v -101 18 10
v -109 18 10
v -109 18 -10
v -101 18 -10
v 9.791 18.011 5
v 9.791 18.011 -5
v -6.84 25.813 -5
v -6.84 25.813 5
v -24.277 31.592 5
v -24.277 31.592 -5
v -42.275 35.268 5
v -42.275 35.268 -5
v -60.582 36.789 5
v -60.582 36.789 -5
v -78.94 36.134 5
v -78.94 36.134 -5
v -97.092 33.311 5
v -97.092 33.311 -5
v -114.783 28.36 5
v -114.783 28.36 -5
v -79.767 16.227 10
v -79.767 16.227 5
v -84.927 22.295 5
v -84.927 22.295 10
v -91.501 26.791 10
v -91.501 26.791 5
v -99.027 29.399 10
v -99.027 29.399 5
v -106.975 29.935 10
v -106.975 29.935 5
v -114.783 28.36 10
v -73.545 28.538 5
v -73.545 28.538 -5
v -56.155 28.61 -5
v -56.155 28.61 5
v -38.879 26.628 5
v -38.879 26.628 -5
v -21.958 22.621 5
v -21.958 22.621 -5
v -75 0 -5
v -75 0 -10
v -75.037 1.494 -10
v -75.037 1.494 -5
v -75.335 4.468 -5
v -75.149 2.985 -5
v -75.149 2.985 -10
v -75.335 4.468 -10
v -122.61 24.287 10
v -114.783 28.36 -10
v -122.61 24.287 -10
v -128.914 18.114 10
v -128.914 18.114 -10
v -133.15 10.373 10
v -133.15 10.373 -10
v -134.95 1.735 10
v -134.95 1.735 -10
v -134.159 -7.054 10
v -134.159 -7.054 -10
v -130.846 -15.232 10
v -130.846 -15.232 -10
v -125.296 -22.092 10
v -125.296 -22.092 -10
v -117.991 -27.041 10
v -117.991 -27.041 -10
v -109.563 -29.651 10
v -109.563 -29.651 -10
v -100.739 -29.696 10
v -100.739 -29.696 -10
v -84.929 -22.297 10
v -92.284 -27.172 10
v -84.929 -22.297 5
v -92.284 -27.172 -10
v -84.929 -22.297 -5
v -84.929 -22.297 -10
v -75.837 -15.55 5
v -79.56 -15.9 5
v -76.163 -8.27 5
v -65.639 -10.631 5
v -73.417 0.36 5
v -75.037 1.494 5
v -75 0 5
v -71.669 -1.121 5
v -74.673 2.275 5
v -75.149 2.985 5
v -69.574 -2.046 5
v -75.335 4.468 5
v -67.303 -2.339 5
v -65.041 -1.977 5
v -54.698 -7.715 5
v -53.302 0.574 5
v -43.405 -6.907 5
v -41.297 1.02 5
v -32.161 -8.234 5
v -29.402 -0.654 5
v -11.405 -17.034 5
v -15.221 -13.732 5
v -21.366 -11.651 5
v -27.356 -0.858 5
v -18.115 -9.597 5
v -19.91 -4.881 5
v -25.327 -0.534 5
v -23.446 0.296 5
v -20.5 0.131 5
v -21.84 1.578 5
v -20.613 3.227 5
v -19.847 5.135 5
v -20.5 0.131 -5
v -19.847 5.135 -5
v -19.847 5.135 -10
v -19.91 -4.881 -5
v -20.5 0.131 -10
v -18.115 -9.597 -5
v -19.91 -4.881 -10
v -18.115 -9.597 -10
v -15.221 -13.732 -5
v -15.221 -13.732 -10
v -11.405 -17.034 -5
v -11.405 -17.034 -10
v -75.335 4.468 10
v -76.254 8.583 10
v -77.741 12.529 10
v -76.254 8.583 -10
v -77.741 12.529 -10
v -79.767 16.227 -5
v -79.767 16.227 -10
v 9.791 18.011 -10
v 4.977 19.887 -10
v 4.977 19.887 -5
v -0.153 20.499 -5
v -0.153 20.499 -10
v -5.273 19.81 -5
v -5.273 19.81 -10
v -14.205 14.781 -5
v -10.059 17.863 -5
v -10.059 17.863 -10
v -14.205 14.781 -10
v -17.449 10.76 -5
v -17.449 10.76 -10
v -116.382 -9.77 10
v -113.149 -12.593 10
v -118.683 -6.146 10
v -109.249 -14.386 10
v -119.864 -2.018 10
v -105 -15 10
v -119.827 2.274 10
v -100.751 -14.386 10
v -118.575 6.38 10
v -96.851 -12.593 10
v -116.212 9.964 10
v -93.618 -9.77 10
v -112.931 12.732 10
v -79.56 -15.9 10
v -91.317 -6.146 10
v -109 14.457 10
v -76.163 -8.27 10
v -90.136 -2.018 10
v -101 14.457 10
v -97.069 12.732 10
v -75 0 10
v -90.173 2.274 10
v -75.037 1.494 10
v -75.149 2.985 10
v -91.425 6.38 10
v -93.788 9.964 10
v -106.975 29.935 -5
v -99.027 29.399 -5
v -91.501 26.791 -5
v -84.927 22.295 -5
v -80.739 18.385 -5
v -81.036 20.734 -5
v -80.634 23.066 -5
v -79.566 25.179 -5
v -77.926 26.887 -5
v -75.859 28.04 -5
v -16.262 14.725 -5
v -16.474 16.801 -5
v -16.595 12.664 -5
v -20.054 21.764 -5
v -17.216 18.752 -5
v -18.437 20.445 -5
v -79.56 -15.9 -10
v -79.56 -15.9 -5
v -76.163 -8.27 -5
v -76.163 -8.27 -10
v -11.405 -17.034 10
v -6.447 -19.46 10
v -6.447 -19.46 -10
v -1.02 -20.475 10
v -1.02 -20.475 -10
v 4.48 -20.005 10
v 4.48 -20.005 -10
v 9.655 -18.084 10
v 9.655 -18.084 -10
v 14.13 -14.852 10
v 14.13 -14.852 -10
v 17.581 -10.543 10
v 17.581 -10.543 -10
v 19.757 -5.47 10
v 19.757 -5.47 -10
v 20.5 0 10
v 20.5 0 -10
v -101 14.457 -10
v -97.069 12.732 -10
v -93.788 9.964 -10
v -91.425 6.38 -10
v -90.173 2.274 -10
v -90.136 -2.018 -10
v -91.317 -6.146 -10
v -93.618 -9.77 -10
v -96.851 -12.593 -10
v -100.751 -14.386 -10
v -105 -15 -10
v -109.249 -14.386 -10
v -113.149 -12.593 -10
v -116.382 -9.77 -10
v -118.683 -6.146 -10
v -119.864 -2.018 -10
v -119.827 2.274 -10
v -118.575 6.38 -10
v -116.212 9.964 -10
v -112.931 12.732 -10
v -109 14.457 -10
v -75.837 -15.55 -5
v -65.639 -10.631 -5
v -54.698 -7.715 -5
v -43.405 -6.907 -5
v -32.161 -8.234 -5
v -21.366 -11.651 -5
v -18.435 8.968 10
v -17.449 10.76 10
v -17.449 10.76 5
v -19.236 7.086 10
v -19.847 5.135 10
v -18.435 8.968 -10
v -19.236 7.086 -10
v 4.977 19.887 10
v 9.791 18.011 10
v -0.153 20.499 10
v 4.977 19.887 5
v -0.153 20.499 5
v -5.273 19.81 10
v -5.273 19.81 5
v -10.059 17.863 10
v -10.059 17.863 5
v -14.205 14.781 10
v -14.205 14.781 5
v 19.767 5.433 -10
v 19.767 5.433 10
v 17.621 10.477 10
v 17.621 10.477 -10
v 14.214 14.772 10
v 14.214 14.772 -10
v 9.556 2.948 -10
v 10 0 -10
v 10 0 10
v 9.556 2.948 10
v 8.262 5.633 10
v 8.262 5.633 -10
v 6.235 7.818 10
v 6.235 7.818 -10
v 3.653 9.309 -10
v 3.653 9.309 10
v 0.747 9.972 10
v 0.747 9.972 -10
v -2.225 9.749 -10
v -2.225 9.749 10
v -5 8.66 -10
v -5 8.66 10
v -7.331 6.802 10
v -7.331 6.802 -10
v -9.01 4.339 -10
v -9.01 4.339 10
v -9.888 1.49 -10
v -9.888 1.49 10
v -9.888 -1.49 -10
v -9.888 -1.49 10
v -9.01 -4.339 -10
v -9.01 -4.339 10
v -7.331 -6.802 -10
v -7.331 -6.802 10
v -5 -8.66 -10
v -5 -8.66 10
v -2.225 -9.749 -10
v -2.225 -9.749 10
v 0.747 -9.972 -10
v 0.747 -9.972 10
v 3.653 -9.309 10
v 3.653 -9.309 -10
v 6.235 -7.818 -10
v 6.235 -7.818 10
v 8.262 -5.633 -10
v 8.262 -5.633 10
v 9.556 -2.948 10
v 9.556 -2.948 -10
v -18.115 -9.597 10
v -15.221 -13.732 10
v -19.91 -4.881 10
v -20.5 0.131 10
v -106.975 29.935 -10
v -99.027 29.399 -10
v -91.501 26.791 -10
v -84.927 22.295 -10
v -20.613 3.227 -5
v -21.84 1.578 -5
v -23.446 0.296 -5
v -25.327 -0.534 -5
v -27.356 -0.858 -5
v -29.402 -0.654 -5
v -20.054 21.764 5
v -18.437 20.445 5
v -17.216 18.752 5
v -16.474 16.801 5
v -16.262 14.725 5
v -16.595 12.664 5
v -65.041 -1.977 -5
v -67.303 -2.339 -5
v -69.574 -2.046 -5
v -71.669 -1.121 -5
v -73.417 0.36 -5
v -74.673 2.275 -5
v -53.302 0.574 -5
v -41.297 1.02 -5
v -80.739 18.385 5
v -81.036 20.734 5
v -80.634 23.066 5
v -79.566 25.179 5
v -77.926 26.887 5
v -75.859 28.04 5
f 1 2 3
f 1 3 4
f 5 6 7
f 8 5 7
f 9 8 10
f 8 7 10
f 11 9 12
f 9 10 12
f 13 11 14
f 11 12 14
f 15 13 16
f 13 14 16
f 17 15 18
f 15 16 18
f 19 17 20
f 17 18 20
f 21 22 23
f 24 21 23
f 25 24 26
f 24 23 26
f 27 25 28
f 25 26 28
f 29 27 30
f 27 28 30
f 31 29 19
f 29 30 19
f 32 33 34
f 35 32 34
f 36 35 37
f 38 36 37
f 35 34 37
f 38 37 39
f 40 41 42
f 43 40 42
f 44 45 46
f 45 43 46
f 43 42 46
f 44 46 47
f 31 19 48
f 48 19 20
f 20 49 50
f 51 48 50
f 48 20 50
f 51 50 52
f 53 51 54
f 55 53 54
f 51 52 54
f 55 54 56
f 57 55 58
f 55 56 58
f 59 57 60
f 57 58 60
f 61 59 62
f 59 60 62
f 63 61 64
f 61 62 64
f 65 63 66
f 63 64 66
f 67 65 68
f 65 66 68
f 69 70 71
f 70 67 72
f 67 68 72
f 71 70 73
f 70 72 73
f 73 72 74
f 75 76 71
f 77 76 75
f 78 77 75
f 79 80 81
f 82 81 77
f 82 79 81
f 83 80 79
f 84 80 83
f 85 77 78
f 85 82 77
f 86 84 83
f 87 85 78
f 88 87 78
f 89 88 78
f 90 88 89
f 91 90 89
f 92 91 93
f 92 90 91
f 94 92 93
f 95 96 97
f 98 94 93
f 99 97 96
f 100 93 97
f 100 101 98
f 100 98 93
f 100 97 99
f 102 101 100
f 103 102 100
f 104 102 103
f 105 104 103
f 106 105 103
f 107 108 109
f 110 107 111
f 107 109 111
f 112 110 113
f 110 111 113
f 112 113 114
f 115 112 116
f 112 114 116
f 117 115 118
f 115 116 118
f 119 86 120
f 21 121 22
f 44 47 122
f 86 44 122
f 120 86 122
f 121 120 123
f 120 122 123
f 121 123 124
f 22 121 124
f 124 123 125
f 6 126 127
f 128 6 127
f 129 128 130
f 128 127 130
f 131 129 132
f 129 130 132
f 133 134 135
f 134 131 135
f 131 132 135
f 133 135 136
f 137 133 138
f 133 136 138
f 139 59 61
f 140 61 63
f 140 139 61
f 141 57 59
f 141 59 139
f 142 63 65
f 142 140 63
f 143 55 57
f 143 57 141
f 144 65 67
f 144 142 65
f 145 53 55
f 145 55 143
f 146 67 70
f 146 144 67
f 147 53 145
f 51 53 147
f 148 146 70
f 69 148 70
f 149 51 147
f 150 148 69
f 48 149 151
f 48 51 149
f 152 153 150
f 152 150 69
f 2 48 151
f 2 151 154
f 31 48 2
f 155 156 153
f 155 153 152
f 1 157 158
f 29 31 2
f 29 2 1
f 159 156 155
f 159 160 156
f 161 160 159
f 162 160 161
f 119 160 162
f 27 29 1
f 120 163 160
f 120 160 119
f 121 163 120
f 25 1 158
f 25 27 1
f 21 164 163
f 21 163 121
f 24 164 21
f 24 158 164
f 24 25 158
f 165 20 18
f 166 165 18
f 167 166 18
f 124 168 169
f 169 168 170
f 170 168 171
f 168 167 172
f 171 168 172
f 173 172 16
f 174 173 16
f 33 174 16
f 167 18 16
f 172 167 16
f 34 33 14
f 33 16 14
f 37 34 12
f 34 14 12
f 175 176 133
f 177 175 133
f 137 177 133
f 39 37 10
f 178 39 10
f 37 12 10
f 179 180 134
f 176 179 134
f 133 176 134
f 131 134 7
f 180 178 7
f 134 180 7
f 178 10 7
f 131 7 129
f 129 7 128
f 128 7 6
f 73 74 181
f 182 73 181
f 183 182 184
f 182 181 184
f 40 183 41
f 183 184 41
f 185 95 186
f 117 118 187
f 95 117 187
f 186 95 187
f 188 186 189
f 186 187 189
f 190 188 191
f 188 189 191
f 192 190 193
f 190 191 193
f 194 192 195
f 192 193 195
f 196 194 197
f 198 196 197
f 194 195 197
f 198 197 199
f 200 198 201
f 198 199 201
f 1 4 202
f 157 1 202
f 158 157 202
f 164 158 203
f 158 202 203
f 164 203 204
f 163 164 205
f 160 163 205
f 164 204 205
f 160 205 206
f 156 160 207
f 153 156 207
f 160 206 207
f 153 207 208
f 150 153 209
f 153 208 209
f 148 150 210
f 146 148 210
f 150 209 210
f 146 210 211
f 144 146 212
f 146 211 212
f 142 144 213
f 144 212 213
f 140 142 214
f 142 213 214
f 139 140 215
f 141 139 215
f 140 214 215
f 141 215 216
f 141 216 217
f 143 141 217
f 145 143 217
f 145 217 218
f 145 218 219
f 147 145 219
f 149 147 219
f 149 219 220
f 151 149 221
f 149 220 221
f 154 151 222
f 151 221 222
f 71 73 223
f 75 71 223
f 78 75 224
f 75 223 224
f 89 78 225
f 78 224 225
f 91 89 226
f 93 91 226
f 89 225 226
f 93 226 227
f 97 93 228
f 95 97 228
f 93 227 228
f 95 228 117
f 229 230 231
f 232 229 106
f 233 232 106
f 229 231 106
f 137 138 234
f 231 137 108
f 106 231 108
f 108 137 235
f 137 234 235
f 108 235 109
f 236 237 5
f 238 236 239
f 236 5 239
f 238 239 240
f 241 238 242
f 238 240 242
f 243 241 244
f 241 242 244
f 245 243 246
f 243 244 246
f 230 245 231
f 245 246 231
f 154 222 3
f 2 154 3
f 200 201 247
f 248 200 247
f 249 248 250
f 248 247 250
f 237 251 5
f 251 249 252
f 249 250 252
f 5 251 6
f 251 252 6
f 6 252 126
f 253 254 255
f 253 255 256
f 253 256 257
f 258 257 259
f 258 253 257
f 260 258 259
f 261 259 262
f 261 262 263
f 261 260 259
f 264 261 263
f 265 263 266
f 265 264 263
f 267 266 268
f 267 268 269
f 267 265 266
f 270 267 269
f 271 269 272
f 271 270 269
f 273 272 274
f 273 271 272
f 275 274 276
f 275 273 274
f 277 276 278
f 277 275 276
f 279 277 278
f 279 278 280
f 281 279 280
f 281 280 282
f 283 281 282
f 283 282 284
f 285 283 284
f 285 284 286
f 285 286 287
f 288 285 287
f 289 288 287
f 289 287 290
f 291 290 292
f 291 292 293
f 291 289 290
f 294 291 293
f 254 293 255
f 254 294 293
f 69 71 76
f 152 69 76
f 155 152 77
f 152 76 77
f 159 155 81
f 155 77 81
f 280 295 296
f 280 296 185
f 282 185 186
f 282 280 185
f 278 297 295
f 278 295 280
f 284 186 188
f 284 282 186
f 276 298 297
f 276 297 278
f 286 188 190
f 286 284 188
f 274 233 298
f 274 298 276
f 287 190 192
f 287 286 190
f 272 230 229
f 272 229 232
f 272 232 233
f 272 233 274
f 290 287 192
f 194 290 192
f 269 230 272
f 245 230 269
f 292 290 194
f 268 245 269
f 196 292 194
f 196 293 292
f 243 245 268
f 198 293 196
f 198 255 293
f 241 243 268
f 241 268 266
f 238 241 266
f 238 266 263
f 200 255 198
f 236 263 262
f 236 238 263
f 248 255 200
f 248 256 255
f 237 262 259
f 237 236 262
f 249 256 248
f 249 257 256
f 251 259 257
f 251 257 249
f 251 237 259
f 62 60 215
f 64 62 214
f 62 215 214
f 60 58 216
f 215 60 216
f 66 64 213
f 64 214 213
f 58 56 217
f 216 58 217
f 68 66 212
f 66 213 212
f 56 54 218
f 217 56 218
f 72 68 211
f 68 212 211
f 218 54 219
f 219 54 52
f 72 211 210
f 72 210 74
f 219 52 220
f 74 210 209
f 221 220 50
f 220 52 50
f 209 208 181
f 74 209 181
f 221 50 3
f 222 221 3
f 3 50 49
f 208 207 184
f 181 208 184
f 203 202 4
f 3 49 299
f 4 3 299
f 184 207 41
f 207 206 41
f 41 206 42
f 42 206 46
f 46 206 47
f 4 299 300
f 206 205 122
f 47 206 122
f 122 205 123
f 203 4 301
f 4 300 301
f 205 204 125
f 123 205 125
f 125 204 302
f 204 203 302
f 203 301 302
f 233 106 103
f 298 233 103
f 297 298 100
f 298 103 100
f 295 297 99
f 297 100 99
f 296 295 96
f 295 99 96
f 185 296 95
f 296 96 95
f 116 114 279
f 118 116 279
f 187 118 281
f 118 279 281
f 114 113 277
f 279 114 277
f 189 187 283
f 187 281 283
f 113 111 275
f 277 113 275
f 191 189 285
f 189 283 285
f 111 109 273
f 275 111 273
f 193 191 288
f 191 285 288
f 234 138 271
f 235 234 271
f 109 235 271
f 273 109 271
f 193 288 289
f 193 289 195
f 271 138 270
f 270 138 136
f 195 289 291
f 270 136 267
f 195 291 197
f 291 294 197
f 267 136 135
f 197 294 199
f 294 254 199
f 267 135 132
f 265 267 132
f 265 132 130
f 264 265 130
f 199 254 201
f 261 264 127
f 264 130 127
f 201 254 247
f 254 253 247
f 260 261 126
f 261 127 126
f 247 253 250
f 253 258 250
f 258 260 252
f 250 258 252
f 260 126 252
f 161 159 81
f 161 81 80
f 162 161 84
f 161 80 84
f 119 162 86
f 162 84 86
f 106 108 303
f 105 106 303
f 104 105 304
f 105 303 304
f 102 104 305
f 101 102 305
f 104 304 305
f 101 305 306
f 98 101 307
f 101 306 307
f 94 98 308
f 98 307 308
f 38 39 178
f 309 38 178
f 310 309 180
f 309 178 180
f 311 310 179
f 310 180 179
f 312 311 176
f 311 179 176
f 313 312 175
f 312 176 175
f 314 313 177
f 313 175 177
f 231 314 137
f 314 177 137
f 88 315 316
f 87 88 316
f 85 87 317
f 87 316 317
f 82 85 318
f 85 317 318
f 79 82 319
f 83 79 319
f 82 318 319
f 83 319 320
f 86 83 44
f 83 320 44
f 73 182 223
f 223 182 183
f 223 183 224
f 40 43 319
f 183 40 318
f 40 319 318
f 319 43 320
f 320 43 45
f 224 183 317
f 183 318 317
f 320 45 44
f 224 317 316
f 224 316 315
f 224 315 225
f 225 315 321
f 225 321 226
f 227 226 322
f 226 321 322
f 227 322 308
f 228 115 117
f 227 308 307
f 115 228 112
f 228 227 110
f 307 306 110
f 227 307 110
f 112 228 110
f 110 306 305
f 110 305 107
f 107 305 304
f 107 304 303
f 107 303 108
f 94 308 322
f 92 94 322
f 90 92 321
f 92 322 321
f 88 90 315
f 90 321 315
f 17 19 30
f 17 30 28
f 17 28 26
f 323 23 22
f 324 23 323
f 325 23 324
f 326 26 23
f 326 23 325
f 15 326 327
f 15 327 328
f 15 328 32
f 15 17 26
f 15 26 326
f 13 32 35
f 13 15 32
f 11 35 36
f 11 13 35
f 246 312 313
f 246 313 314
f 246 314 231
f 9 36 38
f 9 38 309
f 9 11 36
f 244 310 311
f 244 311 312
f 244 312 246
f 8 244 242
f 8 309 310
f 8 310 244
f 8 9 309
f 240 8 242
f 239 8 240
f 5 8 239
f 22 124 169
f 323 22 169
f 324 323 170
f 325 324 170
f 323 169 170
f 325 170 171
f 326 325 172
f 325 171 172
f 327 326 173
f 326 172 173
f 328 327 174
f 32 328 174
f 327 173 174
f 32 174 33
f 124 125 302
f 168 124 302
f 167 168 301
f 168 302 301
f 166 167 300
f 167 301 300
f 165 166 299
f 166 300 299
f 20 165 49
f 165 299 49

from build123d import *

# Parameters (mm, degrees)
BOSS_EXTRUDE1_DEPTH        = 10
BOSS_EXTRUDE1_DEPTH_BACK   = 10
SKETCH1_R                  = 20.5
SKETCH1_R_2                = 10
BOSS_EXTRUDE1_2_DEPTH      = 10
BOSS_EXTRUDE1_2_DEPTH_BACK = 10
SKETCH1_R_3                = 30
BOSS_EXTRUDE3_DEPTH        = 5
BOSS_EXTRUDE3_DEPTH_BACK   = 5


with BuildPart() as part:
    # Sketch1 → Boss-Extrude1 (new, two sides: drawn at the far end of the back side and taken through both)
    with BuildSketch(Plane.XY.offset(-BOSS_EXTRUDE1_DEPTH_BACK)):
        Circle(SKETCH1_R)
        Circle(SKETCH1_R_2, mode=Mode.SUBTRACT)
    extrude(amount=BOSS_EXTRUDE1_DEPTH + BOSS_EXTRUDE1_DEPTH_BACK)



with BuildPart() as body_2:
    # Sketch1 → Boss-Extrude1 2 (new, two sides: drawn at the far end of the back side and taken through both)
    with BuildSketch(Plane.XY.offset(-BOSS_EXTRUDE1_2_DEPTH_BACK)):
        with Locations((-105, 0)):
            Circle(SKETCH1_R_3)
        with BuildLine():
            Line((-101, 18), (-101, 14.456832295))
            ThreePointArc((-101, 14.456832295), (-105, -15), (-109, 14.456832295))
            Line((-109, 14.456832295), (-109, 18))
            Line((-109, 18), (-101, 18))
        make_face(mode=Mode.SUBTRACT)
    extrude(amount=BOSS_EXTRUDE1_2_DEPTH + BOSS_EXTRUDE1_2_DEPTH_BACK)


with BuildPart() as part_1:
    add(part.part)

    add(body_2.part)  # Boss-Extrude3 merges body 2
    # Sketch1<5> → Boss-Extrude3 (add, two sides: drawn at the far end of the back side and taken through both)
    with BuildSketch(Plane.XY.offset(-BOSS_EXTRUDE3_DEPTH_BACK)):
        with BuildLine():
            ThreePointArc((-84.928968254, -22.296943393), (-49.070592623, -7.043942052), (-11.40536084, -17.034310791))
            ThreePointArc((-11.40536084, -17.034310791), (-19.158178407, -7.294806381), (-19.846557236, 5.134604745))
            ThreePointArc((-19.846557236, 5.134604745), (-23.446258475, 0.296093427), (-29.401591979, -0.654192653))
            ThreePointArc((-29.401591979, -0.654192653), (-47.309577117, 1.062360507), (-65.040995656, -1.977258391))
            ThreePointArc((-65.040995656, -1.977258391), (-71.669449556, -1.120833178), (-75.334602536, 4.468130848))
            ThreePointArc((-75.334602536, 4.468130848), (-76.759596366, -10.123220958), (-84.928968254, -22.296943393))
        make_face()
        with BuildLine():
            ThreePointArc((-17.449330151, 10.759687601), (-5.273160122, 19.810193899), (9.791117897, 18.010663795))
            ThreePointArc((9.791117897, 18.010663795), (-51.406147601, 36.300304325), (-114.782571429, 28.360206209))
            ThreePointArc((-114.782571429, 28.360206209), (-95.177372737, 28.346357679), (-79.767134466, 16.226598441))
            ThreePointArc((-79.767134466, 16.226598441), (-80.178220113, 24.162367707), (-73.54479246, 28.537646307))
            ThreePointArc((-73.54479246, 28.537646307), (-47.487956655, 27.874909654), (-21.957791125, 22.620524811))
            ThreePointArc((-21.957791125, 22.620524811), (-16.78083736, 17.80107195), (-17.449330151, 10.759687601))
        make_face()
    extrude(amount=BOSS_EXTRUDE3_DEPTH + BOSS_EXTRUDE3_DEPTH_BACK)


solid = part_1.part
